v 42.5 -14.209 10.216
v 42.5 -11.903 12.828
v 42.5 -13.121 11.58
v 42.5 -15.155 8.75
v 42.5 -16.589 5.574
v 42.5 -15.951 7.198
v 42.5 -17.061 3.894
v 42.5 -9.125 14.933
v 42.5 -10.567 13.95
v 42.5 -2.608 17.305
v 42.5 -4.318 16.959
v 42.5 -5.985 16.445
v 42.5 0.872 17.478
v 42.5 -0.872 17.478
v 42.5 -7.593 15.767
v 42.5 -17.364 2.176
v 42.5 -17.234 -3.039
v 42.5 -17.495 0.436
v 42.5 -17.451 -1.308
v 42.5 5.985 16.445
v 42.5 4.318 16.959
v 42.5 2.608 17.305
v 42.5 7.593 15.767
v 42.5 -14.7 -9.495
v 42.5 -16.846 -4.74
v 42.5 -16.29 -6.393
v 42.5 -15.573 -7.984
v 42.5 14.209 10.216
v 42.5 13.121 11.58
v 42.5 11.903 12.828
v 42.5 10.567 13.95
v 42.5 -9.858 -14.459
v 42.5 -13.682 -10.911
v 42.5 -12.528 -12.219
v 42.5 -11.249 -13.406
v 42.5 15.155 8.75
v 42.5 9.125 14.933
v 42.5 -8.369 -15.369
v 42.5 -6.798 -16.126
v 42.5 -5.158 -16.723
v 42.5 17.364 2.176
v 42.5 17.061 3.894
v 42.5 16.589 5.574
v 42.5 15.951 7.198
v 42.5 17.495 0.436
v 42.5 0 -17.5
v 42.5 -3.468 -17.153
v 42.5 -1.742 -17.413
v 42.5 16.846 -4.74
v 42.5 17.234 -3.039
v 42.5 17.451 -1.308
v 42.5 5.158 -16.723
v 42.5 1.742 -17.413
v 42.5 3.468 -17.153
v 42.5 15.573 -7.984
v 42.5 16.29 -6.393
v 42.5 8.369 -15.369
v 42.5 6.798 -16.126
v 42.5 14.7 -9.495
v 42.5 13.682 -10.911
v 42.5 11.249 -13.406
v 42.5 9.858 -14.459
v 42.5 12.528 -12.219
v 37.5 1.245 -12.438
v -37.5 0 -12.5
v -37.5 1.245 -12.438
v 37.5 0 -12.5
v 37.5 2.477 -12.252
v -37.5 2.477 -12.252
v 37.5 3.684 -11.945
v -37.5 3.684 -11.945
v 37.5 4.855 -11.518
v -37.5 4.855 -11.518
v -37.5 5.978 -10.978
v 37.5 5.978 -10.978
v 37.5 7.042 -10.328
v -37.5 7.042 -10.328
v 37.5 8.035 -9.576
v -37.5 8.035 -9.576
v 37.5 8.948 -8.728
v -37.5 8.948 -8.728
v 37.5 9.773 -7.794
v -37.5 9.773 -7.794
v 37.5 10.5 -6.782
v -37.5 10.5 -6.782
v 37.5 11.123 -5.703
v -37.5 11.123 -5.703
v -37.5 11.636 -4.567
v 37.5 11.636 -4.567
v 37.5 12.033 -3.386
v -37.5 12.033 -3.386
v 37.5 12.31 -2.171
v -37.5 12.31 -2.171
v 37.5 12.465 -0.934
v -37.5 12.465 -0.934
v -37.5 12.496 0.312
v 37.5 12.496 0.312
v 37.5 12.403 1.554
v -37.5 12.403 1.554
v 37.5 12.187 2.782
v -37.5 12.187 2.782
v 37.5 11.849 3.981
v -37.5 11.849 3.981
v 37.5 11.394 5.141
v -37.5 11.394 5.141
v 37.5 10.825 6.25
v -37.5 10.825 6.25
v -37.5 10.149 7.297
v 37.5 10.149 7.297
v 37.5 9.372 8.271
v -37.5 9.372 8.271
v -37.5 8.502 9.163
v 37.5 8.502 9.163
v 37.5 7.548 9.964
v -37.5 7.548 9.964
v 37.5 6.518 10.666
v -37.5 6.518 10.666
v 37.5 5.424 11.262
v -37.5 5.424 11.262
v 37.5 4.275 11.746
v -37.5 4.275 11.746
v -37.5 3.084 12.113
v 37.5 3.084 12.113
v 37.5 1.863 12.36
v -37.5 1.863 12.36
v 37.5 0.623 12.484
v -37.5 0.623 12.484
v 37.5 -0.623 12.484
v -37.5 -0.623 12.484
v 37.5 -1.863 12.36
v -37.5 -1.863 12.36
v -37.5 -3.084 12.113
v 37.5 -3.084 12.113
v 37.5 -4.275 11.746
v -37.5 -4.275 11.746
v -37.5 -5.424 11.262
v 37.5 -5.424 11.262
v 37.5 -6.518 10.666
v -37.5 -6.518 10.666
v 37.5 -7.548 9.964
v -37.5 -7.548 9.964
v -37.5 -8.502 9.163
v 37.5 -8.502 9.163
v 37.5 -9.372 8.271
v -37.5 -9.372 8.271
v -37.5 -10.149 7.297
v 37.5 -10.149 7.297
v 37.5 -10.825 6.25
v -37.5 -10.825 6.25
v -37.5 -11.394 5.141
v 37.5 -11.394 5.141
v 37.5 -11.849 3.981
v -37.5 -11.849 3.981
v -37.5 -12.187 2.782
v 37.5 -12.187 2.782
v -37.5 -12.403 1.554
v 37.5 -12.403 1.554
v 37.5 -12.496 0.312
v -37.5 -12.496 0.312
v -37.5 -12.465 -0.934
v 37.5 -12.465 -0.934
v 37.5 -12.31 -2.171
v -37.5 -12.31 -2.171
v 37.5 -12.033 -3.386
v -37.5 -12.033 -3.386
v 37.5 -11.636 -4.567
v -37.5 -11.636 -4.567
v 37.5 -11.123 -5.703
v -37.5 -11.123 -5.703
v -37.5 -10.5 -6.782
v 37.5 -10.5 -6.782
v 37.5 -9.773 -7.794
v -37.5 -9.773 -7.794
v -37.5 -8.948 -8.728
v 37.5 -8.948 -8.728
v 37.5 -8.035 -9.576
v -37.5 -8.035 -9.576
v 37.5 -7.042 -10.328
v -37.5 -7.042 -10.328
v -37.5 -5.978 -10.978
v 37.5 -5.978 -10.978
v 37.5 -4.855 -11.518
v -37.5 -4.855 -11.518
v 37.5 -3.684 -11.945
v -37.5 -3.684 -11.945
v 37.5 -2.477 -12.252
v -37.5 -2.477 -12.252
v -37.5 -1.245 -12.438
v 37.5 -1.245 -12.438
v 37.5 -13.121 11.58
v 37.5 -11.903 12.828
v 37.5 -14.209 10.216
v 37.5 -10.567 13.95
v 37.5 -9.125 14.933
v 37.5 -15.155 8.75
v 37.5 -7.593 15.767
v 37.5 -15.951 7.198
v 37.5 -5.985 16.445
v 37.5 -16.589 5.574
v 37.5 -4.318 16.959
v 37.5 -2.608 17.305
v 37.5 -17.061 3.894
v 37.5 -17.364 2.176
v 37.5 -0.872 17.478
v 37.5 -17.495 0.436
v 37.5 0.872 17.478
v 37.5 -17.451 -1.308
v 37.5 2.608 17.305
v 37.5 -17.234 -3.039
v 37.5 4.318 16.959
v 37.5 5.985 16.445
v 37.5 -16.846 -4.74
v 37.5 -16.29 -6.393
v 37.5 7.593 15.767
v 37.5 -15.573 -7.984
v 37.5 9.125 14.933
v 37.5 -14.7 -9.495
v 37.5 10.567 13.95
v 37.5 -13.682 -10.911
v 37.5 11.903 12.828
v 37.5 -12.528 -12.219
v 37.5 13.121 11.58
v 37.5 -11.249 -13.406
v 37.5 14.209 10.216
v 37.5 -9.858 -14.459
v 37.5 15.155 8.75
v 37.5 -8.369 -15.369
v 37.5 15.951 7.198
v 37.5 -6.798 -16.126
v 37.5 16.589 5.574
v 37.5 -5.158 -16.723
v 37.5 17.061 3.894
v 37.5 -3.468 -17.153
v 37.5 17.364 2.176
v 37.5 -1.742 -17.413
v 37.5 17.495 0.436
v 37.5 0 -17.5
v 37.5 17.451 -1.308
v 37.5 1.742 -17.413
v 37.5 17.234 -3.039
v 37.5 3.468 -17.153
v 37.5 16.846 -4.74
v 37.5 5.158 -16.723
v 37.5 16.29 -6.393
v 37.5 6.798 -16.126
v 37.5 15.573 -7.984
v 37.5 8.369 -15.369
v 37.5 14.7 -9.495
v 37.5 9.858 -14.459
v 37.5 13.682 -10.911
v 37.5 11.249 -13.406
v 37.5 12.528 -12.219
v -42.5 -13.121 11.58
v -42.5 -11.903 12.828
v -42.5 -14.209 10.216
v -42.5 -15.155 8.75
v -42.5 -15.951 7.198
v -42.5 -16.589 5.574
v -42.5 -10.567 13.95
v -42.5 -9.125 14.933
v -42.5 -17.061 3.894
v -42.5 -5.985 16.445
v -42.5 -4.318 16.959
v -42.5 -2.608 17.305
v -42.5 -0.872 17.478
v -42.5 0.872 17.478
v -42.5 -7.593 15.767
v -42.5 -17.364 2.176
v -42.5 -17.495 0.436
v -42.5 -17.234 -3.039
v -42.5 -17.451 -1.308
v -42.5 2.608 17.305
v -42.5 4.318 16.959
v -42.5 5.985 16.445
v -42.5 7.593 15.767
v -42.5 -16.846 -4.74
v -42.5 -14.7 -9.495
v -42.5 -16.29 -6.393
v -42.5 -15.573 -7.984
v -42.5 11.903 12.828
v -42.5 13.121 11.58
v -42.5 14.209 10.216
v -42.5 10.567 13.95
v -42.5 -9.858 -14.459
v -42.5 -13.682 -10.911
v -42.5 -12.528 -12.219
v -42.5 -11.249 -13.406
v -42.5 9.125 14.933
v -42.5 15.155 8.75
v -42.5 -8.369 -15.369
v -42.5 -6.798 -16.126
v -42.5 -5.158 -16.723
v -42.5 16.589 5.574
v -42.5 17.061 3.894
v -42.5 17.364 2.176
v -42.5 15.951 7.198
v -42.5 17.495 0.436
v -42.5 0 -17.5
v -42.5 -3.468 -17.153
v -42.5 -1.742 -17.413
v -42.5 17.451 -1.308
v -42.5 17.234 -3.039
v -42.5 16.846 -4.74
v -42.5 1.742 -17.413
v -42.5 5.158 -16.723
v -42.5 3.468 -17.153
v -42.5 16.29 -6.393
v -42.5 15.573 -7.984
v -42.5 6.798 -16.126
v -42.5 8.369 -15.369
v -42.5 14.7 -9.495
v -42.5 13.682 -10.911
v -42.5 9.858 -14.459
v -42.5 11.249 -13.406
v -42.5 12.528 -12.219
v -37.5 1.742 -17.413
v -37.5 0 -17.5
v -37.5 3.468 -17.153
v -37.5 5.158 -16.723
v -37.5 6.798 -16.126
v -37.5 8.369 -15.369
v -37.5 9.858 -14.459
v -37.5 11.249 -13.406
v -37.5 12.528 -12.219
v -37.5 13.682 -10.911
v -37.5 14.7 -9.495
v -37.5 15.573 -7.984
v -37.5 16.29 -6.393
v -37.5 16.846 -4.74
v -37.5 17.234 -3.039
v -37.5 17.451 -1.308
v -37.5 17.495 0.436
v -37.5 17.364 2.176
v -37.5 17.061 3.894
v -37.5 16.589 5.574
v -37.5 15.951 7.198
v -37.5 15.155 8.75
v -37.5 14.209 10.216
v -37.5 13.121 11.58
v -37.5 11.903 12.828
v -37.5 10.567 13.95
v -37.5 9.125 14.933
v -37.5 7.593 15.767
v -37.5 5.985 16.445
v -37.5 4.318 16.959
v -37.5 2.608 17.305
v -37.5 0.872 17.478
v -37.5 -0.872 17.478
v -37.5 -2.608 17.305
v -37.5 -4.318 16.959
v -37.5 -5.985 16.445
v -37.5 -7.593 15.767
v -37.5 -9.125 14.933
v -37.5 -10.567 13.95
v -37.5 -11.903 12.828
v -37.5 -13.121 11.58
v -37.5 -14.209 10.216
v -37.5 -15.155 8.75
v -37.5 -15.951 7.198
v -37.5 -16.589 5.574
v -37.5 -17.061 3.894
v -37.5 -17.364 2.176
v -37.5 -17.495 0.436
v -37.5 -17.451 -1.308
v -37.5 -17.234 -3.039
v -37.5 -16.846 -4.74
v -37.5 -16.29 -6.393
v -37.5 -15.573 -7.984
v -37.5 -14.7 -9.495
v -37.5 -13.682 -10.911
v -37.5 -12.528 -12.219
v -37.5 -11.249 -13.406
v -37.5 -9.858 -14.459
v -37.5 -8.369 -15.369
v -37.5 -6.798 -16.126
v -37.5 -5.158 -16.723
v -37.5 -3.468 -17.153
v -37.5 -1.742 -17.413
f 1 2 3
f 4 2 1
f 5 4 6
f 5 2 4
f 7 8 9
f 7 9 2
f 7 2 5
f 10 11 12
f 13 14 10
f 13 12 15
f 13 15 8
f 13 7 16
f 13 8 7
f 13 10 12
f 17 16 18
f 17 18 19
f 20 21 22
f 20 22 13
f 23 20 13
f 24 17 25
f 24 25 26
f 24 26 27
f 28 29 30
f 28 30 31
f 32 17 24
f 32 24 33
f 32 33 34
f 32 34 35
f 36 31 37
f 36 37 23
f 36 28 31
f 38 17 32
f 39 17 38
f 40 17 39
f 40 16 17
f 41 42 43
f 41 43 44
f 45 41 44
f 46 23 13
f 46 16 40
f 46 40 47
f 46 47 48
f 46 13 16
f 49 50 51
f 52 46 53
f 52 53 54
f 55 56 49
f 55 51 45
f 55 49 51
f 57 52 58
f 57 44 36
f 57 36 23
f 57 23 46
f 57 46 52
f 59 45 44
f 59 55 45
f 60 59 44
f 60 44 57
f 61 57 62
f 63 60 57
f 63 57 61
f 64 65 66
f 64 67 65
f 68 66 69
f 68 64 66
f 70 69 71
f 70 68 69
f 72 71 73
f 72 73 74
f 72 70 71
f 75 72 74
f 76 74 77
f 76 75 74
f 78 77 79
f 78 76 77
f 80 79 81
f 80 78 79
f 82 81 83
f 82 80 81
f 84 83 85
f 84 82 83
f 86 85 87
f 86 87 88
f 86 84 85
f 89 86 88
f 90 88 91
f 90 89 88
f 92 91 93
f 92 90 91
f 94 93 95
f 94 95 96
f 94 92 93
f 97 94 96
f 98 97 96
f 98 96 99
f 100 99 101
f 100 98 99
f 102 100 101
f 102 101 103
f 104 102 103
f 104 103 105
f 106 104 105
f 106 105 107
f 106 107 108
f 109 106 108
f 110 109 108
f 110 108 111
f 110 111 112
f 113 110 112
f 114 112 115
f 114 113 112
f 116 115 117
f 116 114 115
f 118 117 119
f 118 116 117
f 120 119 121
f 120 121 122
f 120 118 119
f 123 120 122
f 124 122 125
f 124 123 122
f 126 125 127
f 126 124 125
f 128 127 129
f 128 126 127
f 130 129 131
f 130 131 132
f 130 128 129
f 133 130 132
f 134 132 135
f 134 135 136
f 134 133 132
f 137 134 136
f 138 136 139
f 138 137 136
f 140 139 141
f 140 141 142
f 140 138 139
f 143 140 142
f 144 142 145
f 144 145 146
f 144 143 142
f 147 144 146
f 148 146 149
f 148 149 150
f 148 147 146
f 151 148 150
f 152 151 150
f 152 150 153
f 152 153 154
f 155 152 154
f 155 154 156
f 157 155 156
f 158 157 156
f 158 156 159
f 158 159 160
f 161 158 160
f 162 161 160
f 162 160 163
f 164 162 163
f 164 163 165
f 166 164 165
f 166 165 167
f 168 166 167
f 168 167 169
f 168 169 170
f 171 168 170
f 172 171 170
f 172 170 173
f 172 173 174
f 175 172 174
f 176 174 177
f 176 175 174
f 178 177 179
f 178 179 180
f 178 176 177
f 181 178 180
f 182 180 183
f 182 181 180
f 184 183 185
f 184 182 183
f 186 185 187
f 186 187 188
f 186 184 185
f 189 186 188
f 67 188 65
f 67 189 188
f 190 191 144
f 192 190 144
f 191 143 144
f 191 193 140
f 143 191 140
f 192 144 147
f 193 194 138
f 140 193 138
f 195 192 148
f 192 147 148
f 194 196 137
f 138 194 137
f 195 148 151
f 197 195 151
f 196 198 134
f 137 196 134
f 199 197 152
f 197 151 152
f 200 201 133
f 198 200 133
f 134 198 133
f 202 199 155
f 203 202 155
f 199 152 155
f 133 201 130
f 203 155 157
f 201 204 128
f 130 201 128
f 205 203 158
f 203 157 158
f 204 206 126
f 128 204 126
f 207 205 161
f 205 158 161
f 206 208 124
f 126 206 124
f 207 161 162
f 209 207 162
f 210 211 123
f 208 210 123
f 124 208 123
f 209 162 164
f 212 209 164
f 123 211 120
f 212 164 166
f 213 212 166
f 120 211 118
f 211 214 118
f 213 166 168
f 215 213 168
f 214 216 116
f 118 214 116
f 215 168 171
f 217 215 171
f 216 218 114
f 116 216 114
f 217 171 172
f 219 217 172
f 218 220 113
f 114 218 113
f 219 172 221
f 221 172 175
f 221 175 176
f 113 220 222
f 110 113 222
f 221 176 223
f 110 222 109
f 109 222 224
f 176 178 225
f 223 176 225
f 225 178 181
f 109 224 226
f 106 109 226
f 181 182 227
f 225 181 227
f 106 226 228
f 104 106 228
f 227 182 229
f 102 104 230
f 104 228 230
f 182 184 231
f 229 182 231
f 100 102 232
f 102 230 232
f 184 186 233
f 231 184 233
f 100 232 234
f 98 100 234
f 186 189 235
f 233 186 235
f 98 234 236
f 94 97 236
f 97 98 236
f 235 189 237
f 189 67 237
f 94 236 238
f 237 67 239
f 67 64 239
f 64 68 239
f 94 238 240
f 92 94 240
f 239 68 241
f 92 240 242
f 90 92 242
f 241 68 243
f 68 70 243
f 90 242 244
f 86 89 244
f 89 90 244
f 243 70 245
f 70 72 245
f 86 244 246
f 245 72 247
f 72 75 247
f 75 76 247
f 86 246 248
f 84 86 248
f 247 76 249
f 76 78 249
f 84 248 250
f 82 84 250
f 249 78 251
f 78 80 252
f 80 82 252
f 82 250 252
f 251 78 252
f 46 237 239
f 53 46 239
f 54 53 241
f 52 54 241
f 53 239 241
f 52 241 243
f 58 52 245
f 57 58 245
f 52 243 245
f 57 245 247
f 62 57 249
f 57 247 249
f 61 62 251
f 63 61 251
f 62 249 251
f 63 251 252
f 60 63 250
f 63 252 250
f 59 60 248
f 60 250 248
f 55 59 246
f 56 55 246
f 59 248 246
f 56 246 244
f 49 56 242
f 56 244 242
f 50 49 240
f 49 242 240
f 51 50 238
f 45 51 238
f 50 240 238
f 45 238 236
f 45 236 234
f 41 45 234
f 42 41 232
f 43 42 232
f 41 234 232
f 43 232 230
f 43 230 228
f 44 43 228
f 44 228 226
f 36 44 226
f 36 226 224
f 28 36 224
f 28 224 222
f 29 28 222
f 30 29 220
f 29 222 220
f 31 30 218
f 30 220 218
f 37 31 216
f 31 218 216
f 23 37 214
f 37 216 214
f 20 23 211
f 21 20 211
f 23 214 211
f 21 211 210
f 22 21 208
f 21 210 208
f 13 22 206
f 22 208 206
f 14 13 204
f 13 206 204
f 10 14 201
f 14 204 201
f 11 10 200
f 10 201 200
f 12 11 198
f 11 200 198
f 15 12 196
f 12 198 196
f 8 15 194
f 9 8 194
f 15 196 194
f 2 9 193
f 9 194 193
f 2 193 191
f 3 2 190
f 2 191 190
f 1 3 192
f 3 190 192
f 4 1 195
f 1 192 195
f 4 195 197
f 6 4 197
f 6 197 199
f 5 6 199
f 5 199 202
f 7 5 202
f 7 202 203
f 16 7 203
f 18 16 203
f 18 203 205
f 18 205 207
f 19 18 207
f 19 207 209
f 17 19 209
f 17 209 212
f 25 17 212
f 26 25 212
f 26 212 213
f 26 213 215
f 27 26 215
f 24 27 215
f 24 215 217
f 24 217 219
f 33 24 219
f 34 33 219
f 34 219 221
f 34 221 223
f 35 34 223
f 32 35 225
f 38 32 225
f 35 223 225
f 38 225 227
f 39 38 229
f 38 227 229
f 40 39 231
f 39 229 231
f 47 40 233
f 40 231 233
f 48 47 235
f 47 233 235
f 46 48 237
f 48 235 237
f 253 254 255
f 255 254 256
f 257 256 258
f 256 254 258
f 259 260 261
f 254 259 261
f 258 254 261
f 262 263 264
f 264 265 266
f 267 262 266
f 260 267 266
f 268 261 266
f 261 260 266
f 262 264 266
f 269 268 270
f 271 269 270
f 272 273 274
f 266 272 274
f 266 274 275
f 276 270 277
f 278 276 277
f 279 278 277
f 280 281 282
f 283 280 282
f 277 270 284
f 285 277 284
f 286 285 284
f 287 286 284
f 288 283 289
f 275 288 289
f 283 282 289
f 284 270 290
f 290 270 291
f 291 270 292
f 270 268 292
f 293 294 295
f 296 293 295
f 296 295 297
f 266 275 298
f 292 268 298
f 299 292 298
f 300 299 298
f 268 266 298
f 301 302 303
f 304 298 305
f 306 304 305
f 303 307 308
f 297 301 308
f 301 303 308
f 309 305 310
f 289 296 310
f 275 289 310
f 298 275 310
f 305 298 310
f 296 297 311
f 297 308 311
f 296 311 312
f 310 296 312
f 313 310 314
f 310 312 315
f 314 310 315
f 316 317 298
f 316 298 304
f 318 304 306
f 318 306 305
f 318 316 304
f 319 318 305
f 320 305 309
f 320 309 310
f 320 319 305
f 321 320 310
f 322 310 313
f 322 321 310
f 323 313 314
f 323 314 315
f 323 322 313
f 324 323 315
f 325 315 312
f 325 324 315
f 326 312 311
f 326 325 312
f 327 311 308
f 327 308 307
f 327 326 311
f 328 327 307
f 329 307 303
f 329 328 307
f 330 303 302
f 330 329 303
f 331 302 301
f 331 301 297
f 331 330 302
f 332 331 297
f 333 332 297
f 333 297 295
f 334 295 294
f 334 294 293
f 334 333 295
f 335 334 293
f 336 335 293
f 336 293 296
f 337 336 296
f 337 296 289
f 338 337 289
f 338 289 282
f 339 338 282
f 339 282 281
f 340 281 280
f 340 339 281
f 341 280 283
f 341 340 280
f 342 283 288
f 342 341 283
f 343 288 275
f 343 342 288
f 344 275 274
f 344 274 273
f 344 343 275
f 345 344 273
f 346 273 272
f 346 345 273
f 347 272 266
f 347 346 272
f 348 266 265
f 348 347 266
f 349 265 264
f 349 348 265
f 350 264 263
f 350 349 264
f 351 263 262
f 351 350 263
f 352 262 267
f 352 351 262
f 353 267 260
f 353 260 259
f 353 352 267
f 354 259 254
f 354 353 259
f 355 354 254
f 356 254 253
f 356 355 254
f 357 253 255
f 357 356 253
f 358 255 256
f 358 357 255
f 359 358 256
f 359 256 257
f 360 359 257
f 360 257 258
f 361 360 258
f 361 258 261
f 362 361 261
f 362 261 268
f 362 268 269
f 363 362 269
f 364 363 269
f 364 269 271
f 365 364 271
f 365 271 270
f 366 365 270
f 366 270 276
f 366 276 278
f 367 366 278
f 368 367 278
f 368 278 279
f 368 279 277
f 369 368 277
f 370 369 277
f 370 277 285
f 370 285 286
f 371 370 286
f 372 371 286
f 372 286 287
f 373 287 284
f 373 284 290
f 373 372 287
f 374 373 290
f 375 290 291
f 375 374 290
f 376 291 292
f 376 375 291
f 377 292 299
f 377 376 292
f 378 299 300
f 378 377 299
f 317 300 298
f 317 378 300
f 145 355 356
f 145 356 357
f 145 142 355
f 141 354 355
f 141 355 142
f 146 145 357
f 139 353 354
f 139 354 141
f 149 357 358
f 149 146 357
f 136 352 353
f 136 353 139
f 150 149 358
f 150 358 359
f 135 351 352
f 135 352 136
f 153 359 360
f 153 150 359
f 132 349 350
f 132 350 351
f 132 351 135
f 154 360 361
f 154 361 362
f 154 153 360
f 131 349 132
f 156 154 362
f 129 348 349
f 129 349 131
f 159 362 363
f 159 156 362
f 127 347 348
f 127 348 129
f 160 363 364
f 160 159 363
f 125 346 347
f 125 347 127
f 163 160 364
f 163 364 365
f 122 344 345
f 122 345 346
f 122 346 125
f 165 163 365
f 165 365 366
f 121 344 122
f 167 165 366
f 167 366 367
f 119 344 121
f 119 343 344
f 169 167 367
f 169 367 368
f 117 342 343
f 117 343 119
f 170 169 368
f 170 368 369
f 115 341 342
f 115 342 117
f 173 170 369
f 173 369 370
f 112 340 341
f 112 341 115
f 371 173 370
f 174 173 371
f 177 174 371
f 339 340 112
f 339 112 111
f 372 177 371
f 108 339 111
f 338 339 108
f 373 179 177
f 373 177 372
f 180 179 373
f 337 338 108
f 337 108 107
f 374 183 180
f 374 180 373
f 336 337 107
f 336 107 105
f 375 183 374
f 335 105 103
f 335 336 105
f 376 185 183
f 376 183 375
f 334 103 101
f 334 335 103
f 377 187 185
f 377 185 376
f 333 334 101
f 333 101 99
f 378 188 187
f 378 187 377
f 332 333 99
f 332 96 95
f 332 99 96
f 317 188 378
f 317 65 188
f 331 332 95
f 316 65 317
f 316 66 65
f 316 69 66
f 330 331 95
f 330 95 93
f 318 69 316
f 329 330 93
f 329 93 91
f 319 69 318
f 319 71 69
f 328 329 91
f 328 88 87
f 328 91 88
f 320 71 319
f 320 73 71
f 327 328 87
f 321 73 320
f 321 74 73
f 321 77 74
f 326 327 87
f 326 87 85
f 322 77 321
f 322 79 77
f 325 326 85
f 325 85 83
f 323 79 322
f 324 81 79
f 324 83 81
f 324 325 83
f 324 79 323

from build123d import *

# Parameters (mm, degrees)
SKETCH1_R           = 12.5
BOSS_EXTRUDE1_DEPTH = 37.5
SKETCH4_R           = 17.5
BOSS_EXTRUDE3_DEPTH = 5


with BuildPart() as part:
    # Sketch1 → Boss-Extrude1 (new body, symmetric)
    with BuildSketch(Plane(origin=(0, 0, 0), x_dir=(0, 0, -1), z_dir=(1, 0, 0))):
        Circle(SKETCH1_R)
    extrude(amount=BOSS_EXTRUDE1_DEPTH, both=True)

    # Sketch4 → Boss-Extrude3 (add)
    with BuildSketch(Plane(origin=(37.5, 0, 0), x_dir=(0, 0, -1), z_dir=(1, 0, 0))):
        Circle(SKETCH4_R)
    boss_extrude3 = extrude(amount=BOSS_EXTRUDE3_DEPTH)

    # Mirror1: Boss-Extrude3 across plane
    add(boss_extrude3.mirror(Plane(origin=(0, 0, 0), x_dir=(0, 0, 1), z_dir=(1, 0, 0))))


solid = part.part
